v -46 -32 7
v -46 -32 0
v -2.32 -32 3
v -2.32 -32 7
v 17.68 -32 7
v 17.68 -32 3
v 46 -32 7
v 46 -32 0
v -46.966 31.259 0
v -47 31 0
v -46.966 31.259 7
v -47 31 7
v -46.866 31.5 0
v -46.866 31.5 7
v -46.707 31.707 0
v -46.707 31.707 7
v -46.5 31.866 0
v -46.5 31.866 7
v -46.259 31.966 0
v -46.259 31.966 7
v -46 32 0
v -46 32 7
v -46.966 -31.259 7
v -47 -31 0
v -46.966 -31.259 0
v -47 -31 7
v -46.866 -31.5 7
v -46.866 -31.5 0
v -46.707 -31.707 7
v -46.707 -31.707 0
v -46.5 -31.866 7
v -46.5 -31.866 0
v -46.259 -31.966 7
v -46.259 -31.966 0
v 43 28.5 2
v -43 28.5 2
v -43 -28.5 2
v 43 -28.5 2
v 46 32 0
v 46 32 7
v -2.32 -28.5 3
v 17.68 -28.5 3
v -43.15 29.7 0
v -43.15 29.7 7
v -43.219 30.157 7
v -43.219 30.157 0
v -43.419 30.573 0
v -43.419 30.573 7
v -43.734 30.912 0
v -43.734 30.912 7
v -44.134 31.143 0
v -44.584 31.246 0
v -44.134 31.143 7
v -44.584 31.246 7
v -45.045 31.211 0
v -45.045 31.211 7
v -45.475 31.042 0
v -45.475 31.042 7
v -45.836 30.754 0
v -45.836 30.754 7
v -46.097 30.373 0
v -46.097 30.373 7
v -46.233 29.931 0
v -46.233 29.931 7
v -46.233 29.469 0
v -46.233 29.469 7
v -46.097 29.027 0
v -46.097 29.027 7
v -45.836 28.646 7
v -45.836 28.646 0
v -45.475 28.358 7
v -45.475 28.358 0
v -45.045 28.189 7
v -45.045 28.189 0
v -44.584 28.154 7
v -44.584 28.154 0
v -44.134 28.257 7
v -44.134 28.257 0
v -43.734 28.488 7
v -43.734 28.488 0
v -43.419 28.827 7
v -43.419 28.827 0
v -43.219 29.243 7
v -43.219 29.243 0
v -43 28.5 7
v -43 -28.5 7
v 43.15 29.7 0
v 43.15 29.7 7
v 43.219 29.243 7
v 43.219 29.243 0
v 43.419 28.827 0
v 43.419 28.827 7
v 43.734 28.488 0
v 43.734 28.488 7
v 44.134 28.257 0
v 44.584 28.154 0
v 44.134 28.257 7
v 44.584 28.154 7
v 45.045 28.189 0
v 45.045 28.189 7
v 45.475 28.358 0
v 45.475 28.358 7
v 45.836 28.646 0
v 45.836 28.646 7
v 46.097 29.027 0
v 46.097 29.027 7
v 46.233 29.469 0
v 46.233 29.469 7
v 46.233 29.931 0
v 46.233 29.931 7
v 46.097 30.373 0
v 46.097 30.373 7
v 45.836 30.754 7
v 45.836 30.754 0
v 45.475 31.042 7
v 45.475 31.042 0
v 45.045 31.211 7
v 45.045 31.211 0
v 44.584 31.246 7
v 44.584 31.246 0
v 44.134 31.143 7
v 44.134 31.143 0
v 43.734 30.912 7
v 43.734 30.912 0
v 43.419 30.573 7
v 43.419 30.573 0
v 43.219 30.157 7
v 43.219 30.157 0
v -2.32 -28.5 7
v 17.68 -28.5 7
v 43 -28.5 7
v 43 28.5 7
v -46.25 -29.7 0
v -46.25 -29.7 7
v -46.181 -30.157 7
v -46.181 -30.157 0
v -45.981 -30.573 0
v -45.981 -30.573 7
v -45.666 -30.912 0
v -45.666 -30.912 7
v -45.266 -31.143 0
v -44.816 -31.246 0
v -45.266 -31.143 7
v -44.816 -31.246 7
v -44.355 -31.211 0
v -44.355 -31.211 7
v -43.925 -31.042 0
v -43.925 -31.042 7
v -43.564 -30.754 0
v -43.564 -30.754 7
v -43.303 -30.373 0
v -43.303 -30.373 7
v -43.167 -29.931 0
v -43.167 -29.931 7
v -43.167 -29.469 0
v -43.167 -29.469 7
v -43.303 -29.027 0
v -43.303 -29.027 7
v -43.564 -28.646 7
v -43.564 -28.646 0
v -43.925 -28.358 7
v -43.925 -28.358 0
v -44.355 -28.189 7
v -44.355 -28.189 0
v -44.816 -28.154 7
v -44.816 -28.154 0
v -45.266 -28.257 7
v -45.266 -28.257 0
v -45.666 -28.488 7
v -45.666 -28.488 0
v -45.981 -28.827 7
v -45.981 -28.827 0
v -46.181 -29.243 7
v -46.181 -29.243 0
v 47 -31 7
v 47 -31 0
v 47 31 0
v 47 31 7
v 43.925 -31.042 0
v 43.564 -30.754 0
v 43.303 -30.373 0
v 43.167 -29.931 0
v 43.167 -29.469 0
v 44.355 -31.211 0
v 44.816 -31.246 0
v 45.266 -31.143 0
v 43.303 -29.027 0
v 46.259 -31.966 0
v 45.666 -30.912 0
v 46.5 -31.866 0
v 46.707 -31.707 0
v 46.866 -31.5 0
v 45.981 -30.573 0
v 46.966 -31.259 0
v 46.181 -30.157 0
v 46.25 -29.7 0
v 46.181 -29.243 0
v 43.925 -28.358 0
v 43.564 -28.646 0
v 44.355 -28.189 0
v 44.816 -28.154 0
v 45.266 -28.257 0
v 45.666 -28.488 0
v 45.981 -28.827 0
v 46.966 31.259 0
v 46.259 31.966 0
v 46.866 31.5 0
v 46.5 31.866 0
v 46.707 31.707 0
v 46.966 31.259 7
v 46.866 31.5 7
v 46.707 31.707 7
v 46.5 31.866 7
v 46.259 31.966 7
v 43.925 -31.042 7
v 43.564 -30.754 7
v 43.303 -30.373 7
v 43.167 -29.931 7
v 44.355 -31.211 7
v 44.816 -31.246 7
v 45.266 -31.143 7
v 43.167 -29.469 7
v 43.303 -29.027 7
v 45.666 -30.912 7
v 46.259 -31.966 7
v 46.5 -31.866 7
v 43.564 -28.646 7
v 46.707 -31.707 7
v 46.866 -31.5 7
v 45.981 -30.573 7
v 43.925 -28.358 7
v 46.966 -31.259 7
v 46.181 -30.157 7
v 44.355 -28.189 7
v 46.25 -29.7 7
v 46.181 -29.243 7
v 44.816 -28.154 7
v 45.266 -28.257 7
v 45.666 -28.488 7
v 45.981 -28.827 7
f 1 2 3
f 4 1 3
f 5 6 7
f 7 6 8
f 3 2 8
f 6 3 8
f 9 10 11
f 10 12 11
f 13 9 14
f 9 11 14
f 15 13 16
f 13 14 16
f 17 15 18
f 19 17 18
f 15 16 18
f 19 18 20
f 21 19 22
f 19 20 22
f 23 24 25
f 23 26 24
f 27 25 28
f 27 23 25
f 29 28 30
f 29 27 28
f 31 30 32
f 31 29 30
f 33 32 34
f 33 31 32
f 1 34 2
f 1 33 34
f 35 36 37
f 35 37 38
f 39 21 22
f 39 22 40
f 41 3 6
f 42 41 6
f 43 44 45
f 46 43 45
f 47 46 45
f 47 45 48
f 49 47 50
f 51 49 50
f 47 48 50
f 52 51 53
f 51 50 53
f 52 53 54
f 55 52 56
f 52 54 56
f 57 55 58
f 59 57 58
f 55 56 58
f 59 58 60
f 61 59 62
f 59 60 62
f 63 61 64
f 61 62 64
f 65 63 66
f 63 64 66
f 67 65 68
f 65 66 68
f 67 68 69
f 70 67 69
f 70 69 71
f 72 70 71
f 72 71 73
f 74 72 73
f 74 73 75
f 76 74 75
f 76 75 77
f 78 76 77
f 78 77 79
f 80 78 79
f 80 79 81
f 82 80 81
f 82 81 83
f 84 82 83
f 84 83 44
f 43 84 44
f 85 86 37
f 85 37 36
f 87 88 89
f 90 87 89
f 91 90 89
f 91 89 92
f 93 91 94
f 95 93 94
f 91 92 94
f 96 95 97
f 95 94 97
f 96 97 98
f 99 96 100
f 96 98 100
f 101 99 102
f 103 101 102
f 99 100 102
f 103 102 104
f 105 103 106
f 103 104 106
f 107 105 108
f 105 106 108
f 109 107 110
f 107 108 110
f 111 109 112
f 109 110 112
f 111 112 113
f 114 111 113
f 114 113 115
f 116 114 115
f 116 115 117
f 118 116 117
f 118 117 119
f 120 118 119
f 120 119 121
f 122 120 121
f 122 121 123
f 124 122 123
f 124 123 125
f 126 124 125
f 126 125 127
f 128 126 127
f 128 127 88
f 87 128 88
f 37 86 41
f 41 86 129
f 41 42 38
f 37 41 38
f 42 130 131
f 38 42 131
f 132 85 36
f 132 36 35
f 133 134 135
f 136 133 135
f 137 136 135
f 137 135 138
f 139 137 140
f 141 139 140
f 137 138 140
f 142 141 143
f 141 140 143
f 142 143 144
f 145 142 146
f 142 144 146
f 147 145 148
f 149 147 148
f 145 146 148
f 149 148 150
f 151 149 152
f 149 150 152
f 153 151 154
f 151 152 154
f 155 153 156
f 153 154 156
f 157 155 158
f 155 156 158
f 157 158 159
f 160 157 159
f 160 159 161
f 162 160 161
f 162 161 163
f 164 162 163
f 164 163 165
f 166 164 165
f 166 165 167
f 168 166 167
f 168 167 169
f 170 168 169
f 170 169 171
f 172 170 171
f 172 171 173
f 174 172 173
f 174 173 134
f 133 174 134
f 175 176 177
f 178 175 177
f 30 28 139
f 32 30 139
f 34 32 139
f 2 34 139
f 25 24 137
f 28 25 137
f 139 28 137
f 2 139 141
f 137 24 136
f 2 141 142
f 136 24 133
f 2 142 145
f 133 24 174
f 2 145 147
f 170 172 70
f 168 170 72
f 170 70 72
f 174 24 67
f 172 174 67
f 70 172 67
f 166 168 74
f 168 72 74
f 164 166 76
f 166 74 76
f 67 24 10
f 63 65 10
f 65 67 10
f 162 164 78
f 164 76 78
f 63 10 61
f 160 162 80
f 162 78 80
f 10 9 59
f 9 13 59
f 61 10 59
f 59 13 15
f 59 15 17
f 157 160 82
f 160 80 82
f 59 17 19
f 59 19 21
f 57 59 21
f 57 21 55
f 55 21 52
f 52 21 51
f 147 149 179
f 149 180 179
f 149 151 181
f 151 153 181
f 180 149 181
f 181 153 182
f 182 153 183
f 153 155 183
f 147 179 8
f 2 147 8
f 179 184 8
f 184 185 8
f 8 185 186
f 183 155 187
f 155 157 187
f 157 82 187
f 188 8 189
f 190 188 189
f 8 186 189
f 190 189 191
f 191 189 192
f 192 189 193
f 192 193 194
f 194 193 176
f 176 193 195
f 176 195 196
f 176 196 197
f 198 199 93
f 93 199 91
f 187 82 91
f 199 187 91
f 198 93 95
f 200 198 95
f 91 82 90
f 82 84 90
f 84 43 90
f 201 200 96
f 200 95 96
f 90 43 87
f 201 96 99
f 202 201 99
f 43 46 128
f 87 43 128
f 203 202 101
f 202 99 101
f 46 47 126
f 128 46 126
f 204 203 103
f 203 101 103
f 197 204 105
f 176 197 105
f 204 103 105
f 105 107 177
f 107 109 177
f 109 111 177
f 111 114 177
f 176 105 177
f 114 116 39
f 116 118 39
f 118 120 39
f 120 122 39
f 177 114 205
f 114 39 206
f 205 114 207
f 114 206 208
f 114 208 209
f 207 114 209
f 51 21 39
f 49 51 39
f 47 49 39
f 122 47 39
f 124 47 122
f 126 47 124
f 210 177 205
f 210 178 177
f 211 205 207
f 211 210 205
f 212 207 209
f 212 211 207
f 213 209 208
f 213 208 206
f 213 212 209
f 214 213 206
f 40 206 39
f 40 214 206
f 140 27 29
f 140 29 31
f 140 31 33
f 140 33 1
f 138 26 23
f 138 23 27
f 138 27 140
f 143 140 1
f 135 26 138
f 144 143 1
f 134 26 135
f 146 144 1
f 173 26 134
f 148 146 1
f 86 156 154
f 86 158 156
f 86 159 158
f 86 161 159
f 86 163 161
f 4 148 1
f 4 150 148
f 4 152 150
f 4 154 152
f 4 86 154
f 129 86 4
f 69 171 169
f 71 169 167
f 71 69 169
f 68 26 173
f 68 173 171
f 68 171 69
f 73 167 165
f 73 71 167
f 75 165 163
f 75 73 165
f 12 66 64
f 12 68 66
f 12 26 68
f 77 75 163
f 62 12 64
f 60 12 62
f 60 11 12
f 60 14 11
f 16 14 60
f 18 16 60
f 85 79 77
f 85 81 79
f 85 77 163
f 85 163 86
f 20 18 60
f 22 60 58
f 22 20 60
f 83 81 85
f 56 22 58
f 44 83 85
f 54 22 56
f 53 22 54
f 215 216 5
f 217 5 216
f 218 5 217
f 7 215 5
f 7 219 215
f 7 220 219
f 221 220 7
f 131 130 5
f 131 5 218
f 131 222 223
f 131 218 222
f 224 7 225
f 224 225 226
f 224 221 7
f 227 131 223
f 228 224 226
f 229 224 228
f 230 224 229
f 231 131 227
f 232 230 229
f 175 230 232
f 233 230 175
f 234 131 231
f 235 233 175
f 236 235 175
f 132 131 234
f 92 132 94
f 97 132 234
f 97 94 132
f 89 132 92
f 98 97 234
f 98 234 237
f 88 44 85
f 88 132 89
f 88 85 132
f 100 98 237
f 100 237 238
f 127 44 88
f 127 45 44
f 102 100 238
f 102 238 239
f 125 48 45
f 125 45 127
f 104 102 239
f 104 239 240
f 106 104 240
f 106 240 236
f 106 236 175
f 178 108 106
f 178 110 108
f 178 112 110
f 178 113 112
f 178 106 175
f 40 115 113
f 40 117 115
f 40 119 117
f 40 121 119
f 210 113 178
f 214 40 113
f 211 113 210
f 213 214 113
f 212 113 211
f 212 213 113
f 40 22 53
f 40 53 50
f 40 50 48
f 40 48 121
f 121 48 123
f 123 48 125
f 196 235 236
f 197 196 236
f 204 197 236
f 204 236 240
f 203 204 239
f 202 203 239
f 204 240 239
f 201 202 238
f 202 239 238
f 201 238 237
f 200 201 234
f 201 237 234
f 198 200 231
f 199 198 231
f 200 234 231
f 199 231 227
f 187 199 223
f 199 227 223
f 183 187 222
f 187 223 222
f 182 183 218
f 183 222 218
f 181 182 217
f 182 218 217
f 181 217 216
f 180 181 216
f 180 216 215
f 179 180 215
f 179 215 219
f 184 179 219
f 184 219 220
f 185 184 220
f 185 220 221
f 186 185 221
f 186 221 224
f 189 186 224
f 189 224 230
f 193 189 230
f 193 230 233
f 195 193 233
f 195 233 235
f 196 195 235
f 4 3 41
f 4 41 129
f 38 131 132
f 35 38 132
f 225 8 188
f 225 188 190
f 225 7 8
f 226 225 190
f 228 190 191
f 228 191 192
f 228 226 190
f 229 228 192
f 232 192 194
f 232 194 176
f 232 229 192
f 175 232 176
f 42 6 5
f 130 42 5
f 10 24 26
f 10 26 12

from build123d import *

# Parameters (mm, degrees)
SKETCH_1_W          = 94
SKETCH_1_H          = 64
EXTRUDE_1_DEPTH     = 7
FILLET_1_R          = 1
SKETCH_2_W          = 86
SKETCH_2_H          = 57
CUT_EXTRUDE_1_DEPTH = 5
SKETCH_3_R          = 1.55
CUT_EXTRUDE_2_DEPTH = 58.28874235
SKETCH_4_W          = 20
SKETCH_4_H          = 5
CUT_EXTRUDE_4_DEPTH = 5


with BuildPart() as part:
    # 草图1 → 凸台-拉伸1 (new body)
    with BuildSketch(Plane.XY):
        Rectangle(SKETCH_1_W, SKETCH_1_H)
    extrude(amount=EXTRUDE_1_DEPTH)

    # 圆角1
    fillet_1_edges = [part.edges().sort_by_distance(p)[0] for p in [
        (47, -32, 3.5),
        (-47, -32, 3.5),
        (-47, 32, 3.5),
        (47, 32, 3.5),
    ]]
    fillet(fillet_1_edges, radius=FILLET_1_R)

    # 草图2 → 切除-拉伸1 (cut)
    with BuildSketch(Plane.XY.offset(7)):
        Rectangle(SKETCH_2_W, SKETCH_2_H)
    extrude(amount=-CUT_EXTRUDE_1_DEPTH, mode=Mode.SUBTRACT)

    # 草图3 → 切除-拉伸2 (cut, through all)
    with BuildSketch(Plane.XY.offset(7)):
        with Locations((-44.7, 29.7)):
            Circle(SKETCH_3_R)
        with Locations(Location((44.7, 29.7, 0), (0, 0, 180))):
            Circle(SKETCH_3_R)
        with Locations((44.7, -29.7)):
            Circle(SKETCH_3_R)
        with Locations(Location((-44.7, -29.7, 0), (0, 0, 180))):
            Circle(SKETCH_3_R)
    extrude(amount=-CUT_EXTRUDE_2_DEPTH, mode=Mode.SUBTRACT)

    # 草图4 → 切除-拉伸4 (cut)
    with BuildSketch(Plane.XZ.offset(32)):
        with Locations((7.68, 5.5)):
            Rectangle(SKETCH_4_W, SKETCH_4_H)
    extrude(amount=-CUT_EXTRUDE_4_DEPTH, mode=Mode.SUBTRACT)


solid = part.part
